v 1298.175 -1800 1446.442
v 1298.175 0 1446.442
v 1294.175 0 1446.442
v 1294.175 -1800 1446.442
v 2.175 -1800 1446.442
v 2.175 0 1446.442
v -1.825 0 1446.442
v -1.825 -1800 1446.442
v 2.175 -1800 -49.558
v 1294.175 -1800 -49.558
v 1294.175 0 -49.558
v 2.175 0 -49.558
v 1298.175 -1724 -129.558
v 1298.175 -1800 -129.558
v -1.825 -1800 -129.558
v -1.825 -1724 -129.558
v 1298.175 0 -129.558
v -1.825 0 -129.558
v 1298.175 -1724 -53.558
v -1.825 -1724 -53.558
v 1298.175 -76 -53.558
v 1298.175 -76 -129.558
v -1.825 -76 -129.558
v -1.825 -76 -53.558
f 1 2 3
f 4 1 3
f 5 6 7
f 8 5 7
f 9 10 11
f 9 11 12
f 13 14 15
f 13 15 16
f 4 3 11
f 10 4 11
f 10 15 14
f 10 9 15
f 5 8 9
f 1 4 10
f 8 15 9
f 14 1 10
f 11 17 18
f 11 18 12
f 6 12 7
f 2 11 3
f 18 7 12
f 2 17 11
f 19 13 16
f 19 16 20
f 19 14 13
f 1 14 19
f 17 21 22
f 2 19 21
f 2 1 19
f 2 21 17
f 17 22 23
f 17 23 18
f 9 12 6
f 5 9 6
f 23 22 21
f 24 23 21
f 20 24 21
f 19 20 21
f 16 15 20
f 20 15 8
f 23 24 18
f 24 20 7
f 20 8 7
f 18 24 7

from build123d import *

# Parameters (mm, degrees)
F1_DEPTH = 1800
F2_W     = 76
F2_H     = 76
F3_DEPTH = 1300


with BuildPart() as f1:
    # F0 (on Front) → F1 (new body)
    with BuildSketch(Plane.XZ):
        Polygon((2.1745097741, -49.5584370656), (2.1745097741, 1446.4415629344), (-1.8254902259, 1446.4415629344), (-1.8254902259, -53.5584370656), (1298.1745097741, -53.5584370656), (1298.1745097741, 1446.4415629344), (1294.1745097741, 1446.4415629344), (1294.1745097741, -49.5584370656), align=None)
    extrude(amount=F1_DEPTH)

    # F2 (on face) → F3 (join)
    with BuildSketch(Plane.YZ.offset(1298.1745097741)):
        with Locations((-38, -91.5584370656)):
            Rectangle(F2_W, F2_H)
        with Locations((-1762, -91.5584370656)):
            Rectangle(F2_W, F2_H)
    extrude(amount=-F3_DEPTH)


solid = f1.part
